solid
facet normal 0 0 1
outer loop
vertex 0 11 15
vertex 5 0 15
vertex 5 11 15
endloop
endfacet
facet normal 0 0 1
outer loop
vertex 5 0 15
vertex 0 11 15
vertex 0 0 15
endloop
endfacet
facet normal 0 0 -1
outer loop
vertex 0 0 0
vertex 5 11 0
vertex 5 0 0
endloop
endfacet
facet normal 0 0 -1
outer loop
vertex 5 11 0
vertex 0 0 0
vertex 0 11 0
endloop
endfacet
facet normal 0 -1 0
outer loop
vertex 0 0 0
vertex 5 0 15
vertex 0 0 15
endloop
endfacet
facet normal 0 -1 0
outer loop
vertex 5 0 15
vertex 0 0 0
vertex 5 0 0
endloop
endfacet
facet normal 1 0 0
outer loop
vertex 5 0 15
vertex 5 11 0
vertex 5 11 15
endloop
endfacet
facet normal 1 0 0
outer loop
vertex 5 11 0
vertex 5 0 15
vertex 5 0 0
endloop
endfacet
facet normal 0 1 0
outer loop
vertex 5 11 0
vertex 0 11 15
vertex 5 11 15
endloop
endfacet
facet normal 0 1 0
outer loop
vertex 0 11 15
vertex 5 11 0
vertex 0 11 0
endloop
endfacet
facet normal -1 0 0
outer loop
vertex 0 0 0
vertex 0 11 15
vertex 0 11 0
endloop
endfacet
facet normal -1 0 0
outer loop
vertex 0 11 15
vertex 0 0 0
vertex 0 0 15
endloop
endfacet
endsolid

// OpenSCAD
// Generated by SolidPython 1.0.1 on 2020-07-29 00:46:54


cube(size = [5, 11, 15]);
/***********************************************
*********      SolidPython code:      **********
************************************************
 
# import packages: SolidPython
from solid import *
from solid.utils import *
from itertools import chain, combinations, permutations


class Resize:

    def __init__(self, scad_file):
        self.scad_file = scad_file
        #self.scad_file = import_scad(scad_file)
        # cone/cylinder param:
        self.r1 = 0
        self.r2 = 0
        self.h = 0
        # rectangular prism param:
        self.w = 0
        self.l = 0
        # ellipse param:
        self.r = 0

    # import OpenScad code (file name corresponds to shape)


    # classify shape + parameters
    def assign(self, param1, param2, param3):
        if self.scad_file == 'cone.scad':
            self.r1 = param1
            self.r2 = param2
            self.h = param3
        elif self.scad_file == 'cylinder.scad':
            self.r1 = param1
            self.r2 = param2
            self.h = param3
        elif self.scad_file == 'rectangularPrism.scad':
            self.h = param1
            self.l = param2
            self.w = param3
        else:
            self.r = param1
            self.h = param2

    # resize parameters
    def iterate(self):
        x = range(3, 20, 2)
        i = 1
        if self.scad_file == 'cone.scad':
            tempList = list(permutations(x, 2))
            for temp in tempList:
                param1 = temp[0]
                param2 = temp[1]
                filepath = 'produced_scad_files/' + 'cone' + str(param1) + '_' + str(param2) + '_' + '.scad'
                scad_render_to_file(cylinder(h=param1, r1=param2, r2=0), filepath)

        elif self.scad_file == 'cylinder.scad':
            tempList = list(permutations(x, 3))
            for temp in tempList:
                param1 = temp[0]
                param2 = temp[1]
                filepath = 'produced_scad_files/' + 'cylinder' + str(param1) + '_' + str(param2) + '_' + '.scad'
                scad_render_to_file(cylinder(h=param1, r1=param2, r2=param2), filepath)

        elif self.scad_file == 'rectangularPrism.scad':
            tempList = list(permutations(x, 3))
            for temp in tempList:
                param1 = temp[0]
                param2 = temp[1]
                param3 = temp[2]
                filepath = 'produced_scad_files/' + 'rectangularPrism' + str(param1) + '_' + str(param2) + '_' + str(
                    param3) + '.scad'
                scad_render_to_file(cube(size=(param1, param2, param3)), filepath)

        elif self.scad_file == 'ellipse.scad':
            tempList = list(permutations(x, 4))
            for temp in tempList:
                param1 = temp[0]
                param2 = temp[1]
                param3 = temp[2]
                param4 = temp[3]
                filepath = 'produced_scad_files/' + 'ellipse' + str(param1) + '_' + str(param2) + '_' + str(param3) + '_' + str(param4) + '.scad'
                scad_render_to_file(scale([param1, param2, param3])(sphere(r=param4)), filepath)

    def render_to_scadfile(self):
        scad_render_to_file(scad, 'example.scad') 
 
************************************************/
